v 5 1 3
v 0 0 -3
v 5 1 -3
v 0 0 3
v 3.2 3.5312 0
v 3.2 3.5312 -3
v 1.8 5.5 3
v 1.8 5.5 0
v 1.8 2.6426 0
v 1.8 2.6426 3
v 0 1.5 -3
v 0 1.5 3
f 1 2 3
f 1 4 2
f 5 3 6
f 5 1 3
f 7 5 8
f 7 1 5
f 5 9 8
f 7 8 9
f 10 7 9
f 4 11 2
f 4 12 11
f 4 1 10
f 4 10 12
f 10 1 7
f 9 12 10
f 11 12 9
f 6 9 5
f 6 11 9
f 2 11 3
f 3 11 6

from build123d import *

# Parameters (mm, degrees)
BOSS_EXTRUDE1_DEPTH = 3
BOSS_EXTRUDE2_DEPTH = 3
BOSS_EXTRUDE3_DEPTH = 3
BOSS_EXTRUDE4_DEPTH = 3


with BuildPart() as part:
    # Sketch1 → Boss-Extrude1 (new body)
    with BuildSketch(Plane.XY):
        Polygon((0, 0), (5, 1), (1.8, 5.5), (1.8, 1.5), (0, 1.5), align=None)
    extrude(amount=BOSS_EXTRUDE1_DEPTH)

    # Sketch2 → Boss-Extrude2 (add)
    with BuildSketch(Plane(origin=(0, 0, 0), x_dir=(-1, 0, 0), z_dir=(0, 0, -1))):
        Polygon((-5, 1), (-3.2, 3.53125), (-3.2, 1.5), (0, 1.5), (0, 0), align=None)
    extrude(amount=BOSS_EXTRUDE2_DEPTH)

    # Sketch3 → Boss-Extrude3 (add)
    with BuildSketch(Plane(origin=(0, 0, -3), x_dir=(-1, 0, 0), z_dir=(0, 0, -1))):
        Polygon((-3.2, 3.53125), (0, 1.5), (-3.2, 1.5), align=None)
    extrude(amount=-BOSS_EXTRUDE3_DEPTH)

    # Sketch4 → Boss-Extrude4 (add)
    with BuildSketch(Plane.XY):
        Polygon((1.8, 2.642578125), (1.8, 1.5), (0, 1.5), align=None)
    extrude(amount=BOSS_EXTRUDE4_DEPTH)


solid = part.part
